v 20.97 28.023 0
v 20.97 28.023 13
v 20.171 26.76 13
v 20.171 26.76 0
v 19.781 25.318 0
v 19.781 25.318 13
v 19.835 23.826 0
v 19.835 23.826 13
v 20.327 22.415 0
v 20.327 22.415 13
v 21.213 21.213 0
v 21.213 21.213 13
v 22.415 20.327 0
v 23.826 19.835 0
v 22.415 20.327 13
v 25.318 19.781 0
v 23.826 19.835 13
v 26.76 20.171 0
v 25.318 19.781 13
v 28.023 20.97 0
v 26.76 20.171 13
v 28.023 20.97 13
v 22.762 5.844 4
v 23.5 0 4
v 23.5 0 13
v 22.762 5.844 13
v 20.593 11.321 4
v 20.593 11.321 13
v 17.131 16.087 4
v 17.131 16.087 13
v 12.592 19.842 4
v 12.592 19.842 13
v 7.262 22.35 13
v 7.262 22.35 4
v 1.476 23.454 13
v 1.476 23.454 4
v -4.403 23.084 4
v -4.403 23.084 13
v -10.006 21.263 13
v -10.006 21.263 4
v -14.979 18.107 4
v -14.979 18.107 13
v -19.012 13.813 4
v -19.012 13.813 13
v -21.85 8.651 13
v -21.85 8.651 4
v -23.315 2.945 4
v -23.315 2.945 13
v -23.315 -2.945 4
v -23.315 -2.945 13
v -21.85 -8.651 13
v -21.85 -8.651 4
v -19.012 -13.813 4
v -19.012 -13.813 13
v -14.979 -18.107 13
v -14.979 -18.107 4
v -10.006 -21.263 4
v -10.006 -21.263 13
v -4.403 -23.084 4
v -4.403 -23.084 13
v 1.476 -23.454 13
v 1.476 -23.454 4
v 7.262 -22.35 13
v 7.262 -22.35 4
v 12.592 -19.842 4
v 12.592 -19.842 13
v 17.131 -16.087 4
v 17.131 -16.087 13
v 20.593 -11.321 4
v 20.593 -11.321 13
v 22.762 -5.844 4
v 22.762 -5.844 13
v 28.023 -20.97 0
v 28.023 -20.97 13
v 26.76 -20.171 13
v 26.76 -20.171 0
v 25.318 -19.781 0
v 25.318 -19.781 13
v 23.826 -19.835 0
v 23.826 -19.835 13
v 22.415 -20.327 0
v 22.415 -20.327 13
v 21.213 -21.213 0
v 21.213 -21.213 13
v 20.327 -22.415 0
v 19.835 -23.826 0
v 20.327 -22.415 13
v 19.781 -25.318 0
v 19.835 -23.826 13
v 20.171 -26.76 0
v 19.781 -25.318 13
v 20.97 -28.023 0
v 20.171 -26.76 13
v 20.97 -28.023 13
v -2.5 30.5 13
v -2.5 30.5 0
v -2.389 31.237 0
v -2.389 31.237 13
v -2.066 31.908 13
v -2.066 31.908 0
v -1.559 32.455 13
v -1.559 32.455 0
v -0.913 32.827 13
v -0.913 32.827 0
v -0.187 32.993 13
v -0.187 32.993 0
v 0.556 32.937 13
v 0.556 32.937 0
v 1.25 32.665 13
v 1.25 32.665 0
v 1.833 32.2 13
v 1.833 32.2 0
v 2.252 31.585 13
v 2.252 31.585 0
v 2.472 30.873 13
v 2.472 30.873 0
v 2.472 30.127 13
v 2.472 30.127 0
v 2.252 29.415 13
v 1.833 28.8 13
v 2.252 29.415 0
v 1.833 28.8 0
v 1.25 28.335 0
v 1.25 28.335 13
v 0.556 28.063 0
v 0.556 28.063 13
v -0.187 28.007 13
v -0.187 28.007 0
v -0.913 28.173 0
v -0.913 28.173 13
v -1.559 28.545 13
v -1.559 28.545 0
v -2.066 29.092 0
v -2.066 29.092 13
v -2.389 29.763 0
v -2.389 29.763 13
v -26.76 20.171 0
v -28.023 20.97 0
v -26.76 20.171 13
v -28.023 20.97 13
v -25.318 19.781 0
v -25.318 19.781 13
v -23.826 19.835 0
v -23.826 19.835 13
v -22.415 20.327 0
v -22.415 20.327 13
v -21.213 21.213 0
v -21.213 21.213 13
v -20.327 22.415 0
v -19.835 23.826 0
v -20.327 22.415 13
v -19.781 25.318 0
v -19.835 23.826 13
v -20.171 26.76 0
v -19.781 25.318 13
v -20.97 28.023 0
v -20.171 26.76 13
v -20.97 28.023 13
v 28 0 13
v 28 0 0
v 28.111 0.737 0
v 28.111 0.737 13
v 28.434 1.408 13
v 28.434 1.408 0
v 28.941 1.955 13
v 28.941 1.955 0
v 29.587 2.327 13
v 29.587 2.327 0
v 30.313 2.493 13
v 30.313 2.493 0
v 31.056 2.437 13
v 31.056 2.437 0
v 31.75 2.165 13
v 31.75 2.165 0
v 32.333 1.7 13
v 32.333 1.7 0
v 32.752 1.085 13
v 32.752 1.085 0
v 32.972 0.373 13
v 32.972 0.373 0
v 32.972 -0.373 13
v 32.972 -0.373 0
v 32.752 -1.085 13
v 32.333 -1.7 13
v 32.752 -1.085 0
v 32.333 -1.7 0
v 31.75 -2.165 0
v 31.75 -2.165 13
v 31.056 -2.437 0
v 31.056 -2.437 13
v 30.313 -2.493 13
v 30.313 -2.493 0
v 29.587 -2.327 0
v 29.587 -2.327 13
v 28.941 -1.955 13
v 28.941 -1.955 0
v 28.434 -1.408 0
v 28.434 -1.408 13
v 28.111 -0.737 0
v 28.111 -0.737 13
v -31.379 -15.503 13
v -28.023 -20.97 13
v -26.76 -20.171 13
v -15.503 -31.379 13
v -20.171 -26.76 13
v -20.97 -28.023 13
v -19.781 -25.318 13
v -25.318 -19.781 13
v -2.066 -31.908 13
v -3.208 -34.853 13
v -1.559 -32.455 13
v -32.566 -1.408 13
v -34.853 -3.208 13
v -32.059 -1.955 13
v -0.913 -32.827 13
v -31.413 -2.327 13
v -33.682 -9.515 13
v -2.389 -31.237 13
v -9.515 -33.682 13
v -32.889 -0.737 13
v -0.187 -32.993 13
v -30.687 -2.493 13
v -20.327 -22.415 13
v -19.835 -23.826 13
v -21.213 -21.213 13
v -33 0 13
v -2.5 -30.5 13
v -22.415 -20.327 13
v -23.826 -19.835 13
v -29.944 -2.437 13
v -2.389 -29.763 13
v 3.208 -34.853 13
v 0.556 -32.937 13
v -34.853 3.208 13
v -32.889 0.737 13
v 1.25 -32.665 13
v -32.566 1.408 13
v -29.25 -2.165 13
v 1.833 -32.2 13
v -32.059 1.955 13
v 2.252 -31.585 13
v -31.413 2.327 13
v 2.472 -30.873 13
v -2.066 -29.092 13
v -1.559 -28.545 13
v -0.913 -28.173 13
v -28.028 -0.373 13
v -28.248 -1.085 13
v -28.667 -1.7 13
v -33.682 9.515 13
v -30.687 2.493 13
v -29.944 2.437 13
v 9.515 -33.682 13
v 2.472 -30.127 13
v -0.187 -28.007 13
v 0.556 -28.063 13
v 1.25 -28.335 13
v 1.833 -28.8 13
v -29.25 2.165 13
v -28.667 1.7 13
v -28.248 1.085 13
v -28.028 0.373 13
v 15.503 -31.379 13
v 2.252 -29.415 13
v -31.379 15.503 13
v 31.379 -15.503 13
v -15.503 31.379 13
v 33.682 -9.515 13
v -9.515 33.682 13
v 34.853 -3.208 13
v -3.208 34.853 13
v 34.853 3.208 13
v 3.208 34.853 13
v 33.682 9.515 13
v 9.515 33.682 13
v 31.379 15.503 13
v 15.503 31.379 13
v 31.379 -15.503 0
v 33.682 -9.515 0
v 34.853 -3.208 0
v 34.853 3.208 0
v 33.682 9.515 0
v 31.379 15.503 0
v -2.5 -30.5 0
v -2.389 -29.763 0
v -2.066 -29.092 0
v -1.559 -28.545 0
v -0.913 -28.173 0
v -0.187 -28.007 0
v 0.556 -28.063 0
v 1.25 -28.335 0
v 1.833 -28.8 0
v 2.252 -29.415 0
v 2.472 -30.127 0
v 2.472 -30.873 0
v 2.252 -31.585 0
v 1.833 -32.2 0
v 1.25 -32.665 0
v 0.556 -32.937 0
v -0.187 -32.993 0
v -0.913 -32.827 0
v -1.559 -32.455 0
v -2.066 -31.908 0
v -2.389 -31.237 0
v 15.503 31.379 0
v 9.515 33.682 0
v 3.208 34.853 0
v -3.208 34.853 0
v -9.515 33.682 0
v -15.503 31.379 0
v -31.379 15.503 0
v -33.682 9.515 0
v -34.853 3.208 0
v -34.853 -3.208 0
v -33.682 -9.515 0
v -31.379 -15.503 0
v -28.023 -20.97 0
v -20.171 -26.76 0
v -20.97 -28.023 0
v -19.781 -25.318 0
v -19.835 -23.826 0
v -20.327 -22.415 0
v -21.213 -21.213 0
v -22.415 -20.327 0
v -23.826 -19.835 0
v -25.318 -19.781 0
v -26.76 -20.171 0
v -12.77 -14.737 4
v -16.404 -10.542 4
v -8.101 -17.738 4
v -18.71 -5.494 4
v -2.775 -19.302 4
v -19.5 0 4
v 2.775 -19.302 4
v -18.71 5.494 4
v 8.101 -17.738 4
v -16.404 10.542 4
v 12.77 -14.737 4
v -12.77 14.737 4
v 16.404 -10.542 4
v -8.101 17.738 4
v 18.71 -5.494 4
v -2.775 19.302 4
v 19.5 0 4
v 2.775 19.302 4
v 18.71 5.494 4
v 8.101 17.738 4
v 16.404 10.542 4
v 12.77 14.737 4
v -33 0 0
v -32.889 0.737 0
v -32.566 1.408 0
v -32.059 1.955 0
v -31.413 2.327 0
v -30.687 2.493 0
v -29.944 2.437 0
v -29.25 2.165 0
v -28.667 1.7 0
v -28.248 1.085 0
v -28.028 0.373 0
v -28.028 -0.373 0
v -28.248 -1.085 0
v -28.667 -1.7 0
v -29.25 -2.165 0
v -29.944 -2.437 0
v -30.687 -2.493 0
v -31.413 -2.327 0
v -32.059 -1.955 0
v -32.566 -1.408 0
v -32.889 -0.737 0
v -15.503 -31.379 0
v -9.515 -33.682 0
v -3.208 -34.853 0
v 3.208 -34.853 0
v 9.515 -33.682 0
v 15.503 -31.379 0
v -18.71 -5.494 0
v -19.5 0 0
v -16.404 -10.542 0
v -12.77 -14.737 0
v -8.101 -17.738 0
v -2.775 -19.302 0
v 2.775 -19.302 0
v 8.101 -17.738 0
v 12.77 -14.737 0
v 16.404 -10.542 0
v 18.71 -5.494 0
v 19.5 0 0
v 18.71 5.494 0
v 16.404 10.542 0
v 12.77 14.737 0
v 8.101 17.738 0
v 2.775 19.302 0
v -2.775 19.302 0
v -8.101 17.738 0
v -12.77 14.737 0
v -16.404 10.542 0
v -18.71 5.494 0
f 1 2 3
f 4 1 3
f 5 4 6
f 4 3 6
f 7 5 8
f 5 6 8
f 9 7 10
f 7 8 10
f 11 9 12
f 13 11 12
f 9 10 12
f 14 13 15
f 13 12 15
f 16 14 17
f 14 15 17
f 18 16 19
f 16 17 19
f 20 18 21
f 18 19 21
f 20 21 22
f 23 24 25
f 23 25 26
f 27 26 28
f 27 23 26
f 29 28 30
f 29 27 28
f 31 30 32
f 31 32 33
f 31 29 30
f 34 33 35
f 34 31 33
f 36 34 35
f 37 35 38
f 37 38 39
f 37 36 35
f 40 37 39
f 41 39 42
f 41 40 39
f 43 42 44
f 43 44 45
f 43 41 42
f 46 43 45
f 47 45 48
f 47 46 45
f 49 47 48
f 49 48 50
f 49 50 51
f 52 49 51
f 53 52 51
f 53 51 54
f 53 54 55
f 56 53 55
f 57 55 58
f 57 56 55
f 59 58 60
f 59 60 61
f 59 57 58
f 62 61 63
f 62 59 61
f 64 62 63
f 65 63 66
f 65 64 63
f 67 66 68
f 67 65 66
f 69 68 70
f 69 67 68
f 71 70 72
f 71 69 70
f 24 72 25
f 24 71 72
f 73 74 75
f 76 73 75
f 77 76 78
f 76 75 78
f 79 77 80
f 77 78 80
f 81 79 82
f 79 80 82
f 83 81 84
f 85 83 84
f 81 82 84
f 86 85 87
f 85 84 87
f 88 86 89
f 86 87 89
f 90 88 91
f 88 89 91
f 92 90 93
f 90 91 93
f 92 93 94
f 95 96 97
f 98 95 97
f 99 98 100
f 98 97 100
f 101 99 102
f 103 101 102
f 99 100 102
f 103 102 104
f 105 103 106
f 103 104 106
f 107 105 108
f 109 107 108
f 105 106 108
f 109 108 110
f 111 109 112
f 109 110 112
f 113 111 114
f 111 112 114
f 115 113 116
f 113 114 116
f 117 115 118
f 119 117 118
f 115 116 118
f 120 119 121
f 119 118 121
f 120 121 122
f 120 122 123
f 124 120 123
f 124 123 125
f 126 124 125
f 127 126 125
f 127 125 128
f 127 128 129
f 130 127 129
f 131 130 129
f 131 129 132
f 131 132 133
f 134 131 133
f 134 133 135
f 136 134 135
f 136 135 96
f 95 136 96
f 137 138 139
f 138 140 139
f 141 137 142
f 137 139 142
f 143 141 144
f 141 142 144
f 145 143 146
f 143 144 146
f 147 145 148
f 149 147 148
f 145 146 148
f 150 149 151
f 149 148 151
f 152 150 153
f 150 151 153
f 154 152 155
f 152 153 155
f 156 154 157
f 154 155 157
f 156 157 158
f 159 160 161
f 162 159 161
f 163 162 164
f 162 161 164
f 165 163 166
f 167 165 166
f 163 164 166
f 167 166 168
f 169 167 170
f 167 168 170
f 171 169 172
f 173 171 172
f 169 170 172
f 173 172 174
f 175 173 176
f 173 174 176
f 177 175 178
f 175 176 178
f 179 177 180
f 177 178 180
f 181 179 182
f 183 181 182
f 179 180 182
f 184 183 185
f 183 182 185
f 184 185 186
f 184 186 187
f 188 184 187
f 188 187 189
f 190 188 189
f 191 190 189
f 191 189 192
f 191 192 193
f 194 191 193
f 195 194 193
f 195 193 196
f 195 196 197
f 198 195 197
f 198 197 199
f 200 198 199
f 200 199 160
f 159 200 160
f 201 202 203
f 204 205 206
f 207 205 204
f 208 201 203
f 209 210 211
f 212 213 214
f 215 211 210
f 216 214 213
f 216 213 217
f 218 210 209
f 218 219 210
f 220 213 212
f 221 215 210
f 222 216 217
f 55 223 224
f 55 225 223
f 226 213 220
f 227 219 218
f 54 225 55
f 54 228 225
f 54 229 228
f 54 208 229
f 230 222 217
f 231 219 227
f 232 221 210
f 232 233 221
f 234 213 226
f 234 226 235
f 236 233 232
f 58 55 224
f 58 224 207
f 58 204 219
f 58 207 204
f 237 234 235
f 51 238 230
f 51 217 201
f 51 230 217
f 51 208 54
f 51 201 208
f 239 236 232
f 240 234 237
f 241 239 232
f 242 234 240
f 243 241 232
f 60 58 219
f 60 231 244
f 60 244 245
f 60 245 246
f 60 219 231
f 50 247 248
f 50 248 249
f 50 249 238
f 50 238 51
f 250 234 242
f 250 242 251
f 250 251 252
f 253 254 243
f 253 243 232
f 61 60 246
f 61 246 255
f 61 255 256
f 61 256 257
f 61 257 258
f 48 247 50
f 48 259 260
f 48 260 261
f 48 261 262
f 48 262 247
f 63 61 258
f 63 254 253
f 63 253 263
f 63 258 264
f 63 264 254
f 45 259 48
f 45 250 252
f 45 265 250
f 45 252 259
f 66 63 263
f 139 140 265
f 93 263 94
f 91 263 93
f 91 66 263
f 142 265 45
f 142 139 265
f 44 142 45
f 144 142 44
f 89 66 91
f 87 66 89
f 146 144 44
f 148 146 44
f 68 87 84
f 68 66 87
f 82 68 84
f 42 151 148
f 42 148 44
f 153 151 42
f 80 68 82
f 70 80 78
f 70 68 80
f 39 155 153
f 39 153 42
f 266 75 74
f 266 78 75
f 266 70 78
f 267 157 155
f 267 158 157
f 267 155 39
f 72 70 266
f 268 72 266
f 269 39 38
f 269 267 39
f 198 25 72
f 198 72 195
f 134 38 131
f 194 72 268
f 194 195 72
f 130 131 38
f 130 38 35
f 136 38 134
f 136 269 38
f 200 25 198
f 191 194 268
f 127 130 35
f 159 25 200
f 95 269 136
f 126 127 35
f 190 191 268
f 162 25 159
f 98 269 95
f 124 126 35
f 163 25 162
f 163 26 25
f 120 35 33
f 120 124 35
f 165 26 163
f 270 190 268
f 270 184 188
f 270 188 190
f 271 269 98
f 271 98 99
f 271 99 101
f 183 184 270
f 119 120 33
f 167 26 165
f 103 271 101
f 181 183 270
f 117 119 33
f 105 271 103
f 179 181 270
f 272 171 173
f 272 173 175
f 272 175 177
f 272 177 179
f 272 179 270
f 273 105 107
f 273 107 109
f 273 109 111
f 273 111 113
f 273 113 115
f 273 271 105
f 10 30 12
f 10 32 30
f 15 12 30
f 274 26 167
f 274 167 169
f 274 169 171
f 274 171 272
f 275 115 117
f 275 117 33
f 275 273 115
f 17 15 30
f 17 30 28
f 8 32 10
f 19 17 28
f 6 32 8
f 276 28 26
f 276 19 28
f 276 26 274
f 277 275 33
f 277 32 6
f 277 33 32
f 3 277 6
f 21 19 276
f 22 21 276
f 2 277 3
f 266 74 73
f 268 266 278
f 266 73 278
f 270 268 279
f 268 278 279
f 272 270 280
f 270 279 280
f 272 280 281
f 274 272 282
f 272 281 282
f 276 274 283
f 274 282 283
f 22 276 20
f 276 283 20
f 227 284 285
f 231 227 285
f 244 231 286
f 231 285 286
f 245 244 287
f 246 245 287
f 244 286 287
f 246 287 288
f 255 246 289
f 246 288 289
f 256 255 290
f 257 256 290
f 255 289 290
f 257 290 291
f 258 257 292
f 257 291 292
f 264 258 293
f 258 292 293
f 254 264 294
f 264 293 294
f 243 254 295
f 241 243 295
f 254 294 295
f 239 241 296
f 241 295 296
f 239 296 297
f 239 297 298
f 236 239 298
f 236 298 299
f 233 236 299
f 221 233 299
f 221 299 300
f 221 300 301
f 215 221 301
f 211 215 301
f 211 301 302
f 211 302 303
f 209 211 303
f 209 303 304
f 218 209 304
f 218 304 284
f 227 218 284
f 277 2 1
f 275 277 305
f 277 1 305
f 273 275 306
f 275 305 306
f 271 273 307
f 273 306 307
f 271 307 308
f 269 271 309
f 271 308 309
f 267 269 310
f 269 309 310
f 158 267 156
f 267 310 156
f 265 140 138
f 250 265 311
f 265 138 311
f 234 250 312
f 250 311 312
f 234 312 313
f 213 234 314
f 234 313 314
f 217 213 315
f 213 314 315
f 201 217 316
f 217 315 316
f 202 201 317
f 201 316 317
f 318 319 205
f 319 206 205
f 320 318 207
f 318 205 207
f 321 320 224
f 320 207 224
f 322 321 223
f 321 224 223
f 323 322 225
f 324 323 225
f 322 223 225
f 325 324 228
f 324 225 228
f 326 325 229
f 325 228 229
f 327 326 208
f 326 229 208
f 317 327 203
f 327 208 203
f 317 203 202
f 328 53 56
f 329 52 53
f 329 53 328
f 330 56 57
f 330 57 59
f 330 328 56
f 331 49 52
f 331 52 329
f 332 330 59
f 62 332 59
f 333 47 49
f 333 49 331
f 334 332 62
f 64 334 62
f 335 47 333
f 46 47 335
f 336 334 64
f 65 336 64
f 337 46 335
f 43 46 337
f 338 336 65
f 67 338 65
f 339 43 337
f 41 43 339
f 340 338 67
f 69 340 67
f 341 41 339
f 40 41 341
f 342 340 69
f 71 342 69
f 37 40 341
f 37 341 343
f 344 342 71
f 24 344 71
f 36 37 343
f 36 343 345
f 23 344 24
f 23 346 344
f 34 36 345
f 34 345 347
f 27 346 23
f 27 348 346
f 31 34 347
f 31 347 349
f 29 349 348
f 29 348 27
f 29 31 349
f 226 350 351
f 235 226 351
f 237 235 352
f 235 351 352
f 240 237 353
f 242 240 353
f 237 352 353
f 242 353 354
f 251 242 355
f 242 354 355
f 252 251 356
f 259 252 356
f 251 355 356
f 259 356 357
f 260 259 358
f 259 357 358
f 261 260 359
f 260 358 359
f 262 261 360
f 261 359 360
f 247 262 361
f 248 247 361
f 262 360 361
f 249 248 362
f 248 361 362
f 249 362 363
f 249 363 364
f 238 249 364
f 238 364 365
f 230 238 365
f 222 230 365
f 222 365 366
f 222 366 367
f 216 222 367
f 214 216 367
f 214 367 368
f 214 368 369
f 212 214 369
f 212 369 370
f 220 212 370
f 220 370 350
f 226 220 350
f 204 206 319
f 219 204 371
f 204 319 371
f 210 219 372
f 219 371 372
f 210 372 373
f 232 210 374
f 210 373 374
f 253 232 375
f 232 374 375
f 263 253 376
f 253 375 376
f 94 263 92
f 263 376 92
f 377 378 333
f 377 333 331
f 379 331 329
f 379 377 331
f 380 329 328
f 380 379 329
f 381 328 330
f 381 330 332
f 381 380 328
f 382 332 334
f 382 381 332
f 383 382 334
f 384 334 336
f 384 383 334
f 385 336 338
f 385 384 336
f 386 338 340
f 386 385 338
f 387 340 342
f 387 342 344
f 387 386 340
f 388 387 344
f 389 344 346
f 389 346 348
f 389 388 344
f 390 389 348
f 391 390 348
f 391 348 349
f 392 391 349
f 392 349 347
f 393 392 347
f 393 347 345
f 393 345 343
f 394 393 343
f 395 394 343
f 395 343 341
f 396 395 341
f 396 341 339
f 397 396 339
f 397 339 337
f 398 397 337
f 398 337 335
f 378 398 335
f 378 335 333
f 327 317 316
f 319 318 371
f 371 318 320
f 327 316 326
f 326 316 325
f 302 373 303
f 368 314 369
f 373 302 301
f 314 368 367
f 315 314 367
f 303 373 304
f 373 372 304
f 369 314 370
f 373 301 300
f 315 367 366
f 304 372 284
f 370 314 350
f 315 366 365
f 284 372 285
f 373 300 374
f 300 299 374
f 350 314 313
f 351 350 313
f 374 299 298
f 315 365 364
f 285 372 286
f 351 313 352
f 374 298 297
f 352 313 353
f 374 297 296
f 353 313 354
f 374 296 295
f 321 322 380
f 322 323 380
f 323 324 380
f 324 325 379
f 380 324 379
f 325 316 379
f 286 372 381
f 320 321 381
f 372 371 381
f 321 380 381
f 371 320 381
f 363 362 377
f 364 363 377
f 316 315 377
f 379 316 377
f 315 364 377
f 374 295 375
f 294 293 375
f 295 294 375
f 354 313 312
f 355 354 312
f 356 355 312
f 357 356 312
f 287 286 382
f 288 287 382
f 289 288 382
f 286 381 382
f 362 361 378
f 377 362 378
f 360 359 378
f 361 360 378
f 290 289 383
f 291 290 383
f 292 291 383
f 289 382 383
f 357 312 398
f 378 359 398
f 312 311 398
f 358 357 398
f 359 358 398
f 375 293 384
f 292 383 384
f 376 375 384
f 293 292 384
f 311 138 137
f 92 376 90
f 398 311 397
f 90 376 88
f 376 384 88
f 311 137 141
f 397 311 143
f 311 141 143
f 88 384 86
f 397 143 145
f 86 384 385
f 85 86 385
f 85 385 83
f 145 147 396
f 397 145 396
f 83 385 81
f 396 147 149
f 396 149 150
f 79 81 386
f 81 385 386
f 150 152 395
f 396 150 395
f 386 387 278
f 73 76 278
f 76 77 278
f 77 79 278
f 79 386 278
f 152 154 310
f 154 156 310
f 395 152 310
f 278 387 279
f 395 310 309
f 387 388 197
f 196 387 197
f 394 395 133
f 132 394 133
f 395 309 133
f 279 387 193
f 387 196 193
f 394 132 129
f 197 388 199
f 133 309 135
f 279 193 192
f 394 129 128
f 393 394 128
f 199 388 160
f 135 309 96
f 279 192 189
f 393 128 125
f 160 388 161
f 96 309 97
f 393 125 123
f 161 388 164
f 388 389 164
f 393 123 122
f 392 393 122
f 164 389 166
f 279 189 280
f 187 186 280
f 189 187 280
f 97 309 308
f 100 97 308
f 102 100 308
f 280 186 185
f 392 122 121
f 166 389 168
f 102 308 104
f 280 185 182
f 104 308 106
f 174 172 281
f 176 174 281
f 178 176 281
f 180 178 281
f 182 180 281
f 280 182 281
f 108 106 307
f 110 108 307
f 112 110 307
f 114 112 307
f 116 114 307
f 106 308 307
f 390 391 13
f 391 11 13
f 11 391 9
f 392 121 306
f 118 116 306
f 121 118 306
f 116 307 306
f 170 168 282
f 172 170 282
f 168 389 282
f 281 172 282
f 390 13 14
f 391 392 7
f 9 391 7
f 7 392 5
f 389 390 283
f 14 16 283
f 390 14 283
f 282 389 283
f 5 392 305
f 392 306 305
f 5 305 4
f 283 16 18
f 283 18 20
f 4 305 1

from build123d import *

# Parameters (mm, degrees)
SZKIC1_R                    = 35
SZKIC1_R_2                  = 30.5
SZKIC1_R_3                  = 19.5
DODANIE_WYCI_GNI_CIE1_DEPTH = 13
OTWORY_USTALAJ_CE_5_0MM1_D  = 5
WYTNIJ_WYCI_GNI_CIE1_START  = -9
SZKIC6_R                    = 23.5
SZKIC6_R_2                  = 19.5
WYTNIJ_WYCI_GNI_CIE1_DEPTH  = 9
SZKIC2_R                    = 5
WYTNIJ_WYCI_GNI_CIE2_DEPTH  = 14


with BuildPart() as part:
    # Szkic1 → Dodanie-wyciągnięcie1 (new body)
    # profile 1 of 2: a face of its own
    with BuildSketch(Plane.XY):
        with Locations(Location((0, 0, 0), (0, 0, 180))):
            Circle(SZKIC1_R)
        Circle(SZKIC1_R_2, mode=Mode.SUBTRACT)
    # profile 2 of 2: a face of its own
    with BuildSketch(Plane.XY):
        Circle(SZKIC1_R_2)
        with Locations(Location((0, 0, 0), (0, 0, 180))):
            Circle(SZKIC1_R_3, mode=Mode.SUBTRACT)
    extrude(amount=DODANIE_WYCI_GNI_CIE1_DEPTH)

    # Otwory ustalające Ø5.0mm1 (through all)
    with Locations(Plane.XY.offset(13)):
        with Locations((0, 30.5), (0, -30.5), (-30.5, 0), (30.5, 0)):
            Hole(OTWORY_USTALAJ_CE_5_0MM1_D / 2)

    # Szkic6 → Wytnij-wyciągnięcie1 (cut)
    with BuildSketch(Plane.XY.offset(13).offset(WYTNIJ_WYCI_GNI_CIE1_START)):
        Circle(SZKIC6_R)
        with Locations(Location((0, 0, 0), (0, 0, 180))):
            Circle(SZKIC6_R_2, mode=Mode.SUBTRACT)
    extrude(amount=WYTNIJ_WYCI_GNI_CIE1_DEPTH, mode=Mode.SUBTRACT)

    # Szkic2 → Wytnij-wyciągnięcie2 (cut)
    with BuildSketch(Plane.XY.offset(13)):
        with Locations((24.748737342, 24.748737342)):
            Circle(SZKIC2_R)
        with Locations((24.748737342, -24.748737342)):
            Circle(SZKIC2_R)
        with Locations((-24.748737342, -24.748737342)):
            Circle(SZKIC2_R)
        with Locations((-24.748737342, 24.748737342)):
            Circle(SZKIC2_R)
    extrude(amount=-WYTNIJ_WYCI_GNI_CIE2_DEPTH, mode=Mode.SUBTRACT)


solid = part.part
